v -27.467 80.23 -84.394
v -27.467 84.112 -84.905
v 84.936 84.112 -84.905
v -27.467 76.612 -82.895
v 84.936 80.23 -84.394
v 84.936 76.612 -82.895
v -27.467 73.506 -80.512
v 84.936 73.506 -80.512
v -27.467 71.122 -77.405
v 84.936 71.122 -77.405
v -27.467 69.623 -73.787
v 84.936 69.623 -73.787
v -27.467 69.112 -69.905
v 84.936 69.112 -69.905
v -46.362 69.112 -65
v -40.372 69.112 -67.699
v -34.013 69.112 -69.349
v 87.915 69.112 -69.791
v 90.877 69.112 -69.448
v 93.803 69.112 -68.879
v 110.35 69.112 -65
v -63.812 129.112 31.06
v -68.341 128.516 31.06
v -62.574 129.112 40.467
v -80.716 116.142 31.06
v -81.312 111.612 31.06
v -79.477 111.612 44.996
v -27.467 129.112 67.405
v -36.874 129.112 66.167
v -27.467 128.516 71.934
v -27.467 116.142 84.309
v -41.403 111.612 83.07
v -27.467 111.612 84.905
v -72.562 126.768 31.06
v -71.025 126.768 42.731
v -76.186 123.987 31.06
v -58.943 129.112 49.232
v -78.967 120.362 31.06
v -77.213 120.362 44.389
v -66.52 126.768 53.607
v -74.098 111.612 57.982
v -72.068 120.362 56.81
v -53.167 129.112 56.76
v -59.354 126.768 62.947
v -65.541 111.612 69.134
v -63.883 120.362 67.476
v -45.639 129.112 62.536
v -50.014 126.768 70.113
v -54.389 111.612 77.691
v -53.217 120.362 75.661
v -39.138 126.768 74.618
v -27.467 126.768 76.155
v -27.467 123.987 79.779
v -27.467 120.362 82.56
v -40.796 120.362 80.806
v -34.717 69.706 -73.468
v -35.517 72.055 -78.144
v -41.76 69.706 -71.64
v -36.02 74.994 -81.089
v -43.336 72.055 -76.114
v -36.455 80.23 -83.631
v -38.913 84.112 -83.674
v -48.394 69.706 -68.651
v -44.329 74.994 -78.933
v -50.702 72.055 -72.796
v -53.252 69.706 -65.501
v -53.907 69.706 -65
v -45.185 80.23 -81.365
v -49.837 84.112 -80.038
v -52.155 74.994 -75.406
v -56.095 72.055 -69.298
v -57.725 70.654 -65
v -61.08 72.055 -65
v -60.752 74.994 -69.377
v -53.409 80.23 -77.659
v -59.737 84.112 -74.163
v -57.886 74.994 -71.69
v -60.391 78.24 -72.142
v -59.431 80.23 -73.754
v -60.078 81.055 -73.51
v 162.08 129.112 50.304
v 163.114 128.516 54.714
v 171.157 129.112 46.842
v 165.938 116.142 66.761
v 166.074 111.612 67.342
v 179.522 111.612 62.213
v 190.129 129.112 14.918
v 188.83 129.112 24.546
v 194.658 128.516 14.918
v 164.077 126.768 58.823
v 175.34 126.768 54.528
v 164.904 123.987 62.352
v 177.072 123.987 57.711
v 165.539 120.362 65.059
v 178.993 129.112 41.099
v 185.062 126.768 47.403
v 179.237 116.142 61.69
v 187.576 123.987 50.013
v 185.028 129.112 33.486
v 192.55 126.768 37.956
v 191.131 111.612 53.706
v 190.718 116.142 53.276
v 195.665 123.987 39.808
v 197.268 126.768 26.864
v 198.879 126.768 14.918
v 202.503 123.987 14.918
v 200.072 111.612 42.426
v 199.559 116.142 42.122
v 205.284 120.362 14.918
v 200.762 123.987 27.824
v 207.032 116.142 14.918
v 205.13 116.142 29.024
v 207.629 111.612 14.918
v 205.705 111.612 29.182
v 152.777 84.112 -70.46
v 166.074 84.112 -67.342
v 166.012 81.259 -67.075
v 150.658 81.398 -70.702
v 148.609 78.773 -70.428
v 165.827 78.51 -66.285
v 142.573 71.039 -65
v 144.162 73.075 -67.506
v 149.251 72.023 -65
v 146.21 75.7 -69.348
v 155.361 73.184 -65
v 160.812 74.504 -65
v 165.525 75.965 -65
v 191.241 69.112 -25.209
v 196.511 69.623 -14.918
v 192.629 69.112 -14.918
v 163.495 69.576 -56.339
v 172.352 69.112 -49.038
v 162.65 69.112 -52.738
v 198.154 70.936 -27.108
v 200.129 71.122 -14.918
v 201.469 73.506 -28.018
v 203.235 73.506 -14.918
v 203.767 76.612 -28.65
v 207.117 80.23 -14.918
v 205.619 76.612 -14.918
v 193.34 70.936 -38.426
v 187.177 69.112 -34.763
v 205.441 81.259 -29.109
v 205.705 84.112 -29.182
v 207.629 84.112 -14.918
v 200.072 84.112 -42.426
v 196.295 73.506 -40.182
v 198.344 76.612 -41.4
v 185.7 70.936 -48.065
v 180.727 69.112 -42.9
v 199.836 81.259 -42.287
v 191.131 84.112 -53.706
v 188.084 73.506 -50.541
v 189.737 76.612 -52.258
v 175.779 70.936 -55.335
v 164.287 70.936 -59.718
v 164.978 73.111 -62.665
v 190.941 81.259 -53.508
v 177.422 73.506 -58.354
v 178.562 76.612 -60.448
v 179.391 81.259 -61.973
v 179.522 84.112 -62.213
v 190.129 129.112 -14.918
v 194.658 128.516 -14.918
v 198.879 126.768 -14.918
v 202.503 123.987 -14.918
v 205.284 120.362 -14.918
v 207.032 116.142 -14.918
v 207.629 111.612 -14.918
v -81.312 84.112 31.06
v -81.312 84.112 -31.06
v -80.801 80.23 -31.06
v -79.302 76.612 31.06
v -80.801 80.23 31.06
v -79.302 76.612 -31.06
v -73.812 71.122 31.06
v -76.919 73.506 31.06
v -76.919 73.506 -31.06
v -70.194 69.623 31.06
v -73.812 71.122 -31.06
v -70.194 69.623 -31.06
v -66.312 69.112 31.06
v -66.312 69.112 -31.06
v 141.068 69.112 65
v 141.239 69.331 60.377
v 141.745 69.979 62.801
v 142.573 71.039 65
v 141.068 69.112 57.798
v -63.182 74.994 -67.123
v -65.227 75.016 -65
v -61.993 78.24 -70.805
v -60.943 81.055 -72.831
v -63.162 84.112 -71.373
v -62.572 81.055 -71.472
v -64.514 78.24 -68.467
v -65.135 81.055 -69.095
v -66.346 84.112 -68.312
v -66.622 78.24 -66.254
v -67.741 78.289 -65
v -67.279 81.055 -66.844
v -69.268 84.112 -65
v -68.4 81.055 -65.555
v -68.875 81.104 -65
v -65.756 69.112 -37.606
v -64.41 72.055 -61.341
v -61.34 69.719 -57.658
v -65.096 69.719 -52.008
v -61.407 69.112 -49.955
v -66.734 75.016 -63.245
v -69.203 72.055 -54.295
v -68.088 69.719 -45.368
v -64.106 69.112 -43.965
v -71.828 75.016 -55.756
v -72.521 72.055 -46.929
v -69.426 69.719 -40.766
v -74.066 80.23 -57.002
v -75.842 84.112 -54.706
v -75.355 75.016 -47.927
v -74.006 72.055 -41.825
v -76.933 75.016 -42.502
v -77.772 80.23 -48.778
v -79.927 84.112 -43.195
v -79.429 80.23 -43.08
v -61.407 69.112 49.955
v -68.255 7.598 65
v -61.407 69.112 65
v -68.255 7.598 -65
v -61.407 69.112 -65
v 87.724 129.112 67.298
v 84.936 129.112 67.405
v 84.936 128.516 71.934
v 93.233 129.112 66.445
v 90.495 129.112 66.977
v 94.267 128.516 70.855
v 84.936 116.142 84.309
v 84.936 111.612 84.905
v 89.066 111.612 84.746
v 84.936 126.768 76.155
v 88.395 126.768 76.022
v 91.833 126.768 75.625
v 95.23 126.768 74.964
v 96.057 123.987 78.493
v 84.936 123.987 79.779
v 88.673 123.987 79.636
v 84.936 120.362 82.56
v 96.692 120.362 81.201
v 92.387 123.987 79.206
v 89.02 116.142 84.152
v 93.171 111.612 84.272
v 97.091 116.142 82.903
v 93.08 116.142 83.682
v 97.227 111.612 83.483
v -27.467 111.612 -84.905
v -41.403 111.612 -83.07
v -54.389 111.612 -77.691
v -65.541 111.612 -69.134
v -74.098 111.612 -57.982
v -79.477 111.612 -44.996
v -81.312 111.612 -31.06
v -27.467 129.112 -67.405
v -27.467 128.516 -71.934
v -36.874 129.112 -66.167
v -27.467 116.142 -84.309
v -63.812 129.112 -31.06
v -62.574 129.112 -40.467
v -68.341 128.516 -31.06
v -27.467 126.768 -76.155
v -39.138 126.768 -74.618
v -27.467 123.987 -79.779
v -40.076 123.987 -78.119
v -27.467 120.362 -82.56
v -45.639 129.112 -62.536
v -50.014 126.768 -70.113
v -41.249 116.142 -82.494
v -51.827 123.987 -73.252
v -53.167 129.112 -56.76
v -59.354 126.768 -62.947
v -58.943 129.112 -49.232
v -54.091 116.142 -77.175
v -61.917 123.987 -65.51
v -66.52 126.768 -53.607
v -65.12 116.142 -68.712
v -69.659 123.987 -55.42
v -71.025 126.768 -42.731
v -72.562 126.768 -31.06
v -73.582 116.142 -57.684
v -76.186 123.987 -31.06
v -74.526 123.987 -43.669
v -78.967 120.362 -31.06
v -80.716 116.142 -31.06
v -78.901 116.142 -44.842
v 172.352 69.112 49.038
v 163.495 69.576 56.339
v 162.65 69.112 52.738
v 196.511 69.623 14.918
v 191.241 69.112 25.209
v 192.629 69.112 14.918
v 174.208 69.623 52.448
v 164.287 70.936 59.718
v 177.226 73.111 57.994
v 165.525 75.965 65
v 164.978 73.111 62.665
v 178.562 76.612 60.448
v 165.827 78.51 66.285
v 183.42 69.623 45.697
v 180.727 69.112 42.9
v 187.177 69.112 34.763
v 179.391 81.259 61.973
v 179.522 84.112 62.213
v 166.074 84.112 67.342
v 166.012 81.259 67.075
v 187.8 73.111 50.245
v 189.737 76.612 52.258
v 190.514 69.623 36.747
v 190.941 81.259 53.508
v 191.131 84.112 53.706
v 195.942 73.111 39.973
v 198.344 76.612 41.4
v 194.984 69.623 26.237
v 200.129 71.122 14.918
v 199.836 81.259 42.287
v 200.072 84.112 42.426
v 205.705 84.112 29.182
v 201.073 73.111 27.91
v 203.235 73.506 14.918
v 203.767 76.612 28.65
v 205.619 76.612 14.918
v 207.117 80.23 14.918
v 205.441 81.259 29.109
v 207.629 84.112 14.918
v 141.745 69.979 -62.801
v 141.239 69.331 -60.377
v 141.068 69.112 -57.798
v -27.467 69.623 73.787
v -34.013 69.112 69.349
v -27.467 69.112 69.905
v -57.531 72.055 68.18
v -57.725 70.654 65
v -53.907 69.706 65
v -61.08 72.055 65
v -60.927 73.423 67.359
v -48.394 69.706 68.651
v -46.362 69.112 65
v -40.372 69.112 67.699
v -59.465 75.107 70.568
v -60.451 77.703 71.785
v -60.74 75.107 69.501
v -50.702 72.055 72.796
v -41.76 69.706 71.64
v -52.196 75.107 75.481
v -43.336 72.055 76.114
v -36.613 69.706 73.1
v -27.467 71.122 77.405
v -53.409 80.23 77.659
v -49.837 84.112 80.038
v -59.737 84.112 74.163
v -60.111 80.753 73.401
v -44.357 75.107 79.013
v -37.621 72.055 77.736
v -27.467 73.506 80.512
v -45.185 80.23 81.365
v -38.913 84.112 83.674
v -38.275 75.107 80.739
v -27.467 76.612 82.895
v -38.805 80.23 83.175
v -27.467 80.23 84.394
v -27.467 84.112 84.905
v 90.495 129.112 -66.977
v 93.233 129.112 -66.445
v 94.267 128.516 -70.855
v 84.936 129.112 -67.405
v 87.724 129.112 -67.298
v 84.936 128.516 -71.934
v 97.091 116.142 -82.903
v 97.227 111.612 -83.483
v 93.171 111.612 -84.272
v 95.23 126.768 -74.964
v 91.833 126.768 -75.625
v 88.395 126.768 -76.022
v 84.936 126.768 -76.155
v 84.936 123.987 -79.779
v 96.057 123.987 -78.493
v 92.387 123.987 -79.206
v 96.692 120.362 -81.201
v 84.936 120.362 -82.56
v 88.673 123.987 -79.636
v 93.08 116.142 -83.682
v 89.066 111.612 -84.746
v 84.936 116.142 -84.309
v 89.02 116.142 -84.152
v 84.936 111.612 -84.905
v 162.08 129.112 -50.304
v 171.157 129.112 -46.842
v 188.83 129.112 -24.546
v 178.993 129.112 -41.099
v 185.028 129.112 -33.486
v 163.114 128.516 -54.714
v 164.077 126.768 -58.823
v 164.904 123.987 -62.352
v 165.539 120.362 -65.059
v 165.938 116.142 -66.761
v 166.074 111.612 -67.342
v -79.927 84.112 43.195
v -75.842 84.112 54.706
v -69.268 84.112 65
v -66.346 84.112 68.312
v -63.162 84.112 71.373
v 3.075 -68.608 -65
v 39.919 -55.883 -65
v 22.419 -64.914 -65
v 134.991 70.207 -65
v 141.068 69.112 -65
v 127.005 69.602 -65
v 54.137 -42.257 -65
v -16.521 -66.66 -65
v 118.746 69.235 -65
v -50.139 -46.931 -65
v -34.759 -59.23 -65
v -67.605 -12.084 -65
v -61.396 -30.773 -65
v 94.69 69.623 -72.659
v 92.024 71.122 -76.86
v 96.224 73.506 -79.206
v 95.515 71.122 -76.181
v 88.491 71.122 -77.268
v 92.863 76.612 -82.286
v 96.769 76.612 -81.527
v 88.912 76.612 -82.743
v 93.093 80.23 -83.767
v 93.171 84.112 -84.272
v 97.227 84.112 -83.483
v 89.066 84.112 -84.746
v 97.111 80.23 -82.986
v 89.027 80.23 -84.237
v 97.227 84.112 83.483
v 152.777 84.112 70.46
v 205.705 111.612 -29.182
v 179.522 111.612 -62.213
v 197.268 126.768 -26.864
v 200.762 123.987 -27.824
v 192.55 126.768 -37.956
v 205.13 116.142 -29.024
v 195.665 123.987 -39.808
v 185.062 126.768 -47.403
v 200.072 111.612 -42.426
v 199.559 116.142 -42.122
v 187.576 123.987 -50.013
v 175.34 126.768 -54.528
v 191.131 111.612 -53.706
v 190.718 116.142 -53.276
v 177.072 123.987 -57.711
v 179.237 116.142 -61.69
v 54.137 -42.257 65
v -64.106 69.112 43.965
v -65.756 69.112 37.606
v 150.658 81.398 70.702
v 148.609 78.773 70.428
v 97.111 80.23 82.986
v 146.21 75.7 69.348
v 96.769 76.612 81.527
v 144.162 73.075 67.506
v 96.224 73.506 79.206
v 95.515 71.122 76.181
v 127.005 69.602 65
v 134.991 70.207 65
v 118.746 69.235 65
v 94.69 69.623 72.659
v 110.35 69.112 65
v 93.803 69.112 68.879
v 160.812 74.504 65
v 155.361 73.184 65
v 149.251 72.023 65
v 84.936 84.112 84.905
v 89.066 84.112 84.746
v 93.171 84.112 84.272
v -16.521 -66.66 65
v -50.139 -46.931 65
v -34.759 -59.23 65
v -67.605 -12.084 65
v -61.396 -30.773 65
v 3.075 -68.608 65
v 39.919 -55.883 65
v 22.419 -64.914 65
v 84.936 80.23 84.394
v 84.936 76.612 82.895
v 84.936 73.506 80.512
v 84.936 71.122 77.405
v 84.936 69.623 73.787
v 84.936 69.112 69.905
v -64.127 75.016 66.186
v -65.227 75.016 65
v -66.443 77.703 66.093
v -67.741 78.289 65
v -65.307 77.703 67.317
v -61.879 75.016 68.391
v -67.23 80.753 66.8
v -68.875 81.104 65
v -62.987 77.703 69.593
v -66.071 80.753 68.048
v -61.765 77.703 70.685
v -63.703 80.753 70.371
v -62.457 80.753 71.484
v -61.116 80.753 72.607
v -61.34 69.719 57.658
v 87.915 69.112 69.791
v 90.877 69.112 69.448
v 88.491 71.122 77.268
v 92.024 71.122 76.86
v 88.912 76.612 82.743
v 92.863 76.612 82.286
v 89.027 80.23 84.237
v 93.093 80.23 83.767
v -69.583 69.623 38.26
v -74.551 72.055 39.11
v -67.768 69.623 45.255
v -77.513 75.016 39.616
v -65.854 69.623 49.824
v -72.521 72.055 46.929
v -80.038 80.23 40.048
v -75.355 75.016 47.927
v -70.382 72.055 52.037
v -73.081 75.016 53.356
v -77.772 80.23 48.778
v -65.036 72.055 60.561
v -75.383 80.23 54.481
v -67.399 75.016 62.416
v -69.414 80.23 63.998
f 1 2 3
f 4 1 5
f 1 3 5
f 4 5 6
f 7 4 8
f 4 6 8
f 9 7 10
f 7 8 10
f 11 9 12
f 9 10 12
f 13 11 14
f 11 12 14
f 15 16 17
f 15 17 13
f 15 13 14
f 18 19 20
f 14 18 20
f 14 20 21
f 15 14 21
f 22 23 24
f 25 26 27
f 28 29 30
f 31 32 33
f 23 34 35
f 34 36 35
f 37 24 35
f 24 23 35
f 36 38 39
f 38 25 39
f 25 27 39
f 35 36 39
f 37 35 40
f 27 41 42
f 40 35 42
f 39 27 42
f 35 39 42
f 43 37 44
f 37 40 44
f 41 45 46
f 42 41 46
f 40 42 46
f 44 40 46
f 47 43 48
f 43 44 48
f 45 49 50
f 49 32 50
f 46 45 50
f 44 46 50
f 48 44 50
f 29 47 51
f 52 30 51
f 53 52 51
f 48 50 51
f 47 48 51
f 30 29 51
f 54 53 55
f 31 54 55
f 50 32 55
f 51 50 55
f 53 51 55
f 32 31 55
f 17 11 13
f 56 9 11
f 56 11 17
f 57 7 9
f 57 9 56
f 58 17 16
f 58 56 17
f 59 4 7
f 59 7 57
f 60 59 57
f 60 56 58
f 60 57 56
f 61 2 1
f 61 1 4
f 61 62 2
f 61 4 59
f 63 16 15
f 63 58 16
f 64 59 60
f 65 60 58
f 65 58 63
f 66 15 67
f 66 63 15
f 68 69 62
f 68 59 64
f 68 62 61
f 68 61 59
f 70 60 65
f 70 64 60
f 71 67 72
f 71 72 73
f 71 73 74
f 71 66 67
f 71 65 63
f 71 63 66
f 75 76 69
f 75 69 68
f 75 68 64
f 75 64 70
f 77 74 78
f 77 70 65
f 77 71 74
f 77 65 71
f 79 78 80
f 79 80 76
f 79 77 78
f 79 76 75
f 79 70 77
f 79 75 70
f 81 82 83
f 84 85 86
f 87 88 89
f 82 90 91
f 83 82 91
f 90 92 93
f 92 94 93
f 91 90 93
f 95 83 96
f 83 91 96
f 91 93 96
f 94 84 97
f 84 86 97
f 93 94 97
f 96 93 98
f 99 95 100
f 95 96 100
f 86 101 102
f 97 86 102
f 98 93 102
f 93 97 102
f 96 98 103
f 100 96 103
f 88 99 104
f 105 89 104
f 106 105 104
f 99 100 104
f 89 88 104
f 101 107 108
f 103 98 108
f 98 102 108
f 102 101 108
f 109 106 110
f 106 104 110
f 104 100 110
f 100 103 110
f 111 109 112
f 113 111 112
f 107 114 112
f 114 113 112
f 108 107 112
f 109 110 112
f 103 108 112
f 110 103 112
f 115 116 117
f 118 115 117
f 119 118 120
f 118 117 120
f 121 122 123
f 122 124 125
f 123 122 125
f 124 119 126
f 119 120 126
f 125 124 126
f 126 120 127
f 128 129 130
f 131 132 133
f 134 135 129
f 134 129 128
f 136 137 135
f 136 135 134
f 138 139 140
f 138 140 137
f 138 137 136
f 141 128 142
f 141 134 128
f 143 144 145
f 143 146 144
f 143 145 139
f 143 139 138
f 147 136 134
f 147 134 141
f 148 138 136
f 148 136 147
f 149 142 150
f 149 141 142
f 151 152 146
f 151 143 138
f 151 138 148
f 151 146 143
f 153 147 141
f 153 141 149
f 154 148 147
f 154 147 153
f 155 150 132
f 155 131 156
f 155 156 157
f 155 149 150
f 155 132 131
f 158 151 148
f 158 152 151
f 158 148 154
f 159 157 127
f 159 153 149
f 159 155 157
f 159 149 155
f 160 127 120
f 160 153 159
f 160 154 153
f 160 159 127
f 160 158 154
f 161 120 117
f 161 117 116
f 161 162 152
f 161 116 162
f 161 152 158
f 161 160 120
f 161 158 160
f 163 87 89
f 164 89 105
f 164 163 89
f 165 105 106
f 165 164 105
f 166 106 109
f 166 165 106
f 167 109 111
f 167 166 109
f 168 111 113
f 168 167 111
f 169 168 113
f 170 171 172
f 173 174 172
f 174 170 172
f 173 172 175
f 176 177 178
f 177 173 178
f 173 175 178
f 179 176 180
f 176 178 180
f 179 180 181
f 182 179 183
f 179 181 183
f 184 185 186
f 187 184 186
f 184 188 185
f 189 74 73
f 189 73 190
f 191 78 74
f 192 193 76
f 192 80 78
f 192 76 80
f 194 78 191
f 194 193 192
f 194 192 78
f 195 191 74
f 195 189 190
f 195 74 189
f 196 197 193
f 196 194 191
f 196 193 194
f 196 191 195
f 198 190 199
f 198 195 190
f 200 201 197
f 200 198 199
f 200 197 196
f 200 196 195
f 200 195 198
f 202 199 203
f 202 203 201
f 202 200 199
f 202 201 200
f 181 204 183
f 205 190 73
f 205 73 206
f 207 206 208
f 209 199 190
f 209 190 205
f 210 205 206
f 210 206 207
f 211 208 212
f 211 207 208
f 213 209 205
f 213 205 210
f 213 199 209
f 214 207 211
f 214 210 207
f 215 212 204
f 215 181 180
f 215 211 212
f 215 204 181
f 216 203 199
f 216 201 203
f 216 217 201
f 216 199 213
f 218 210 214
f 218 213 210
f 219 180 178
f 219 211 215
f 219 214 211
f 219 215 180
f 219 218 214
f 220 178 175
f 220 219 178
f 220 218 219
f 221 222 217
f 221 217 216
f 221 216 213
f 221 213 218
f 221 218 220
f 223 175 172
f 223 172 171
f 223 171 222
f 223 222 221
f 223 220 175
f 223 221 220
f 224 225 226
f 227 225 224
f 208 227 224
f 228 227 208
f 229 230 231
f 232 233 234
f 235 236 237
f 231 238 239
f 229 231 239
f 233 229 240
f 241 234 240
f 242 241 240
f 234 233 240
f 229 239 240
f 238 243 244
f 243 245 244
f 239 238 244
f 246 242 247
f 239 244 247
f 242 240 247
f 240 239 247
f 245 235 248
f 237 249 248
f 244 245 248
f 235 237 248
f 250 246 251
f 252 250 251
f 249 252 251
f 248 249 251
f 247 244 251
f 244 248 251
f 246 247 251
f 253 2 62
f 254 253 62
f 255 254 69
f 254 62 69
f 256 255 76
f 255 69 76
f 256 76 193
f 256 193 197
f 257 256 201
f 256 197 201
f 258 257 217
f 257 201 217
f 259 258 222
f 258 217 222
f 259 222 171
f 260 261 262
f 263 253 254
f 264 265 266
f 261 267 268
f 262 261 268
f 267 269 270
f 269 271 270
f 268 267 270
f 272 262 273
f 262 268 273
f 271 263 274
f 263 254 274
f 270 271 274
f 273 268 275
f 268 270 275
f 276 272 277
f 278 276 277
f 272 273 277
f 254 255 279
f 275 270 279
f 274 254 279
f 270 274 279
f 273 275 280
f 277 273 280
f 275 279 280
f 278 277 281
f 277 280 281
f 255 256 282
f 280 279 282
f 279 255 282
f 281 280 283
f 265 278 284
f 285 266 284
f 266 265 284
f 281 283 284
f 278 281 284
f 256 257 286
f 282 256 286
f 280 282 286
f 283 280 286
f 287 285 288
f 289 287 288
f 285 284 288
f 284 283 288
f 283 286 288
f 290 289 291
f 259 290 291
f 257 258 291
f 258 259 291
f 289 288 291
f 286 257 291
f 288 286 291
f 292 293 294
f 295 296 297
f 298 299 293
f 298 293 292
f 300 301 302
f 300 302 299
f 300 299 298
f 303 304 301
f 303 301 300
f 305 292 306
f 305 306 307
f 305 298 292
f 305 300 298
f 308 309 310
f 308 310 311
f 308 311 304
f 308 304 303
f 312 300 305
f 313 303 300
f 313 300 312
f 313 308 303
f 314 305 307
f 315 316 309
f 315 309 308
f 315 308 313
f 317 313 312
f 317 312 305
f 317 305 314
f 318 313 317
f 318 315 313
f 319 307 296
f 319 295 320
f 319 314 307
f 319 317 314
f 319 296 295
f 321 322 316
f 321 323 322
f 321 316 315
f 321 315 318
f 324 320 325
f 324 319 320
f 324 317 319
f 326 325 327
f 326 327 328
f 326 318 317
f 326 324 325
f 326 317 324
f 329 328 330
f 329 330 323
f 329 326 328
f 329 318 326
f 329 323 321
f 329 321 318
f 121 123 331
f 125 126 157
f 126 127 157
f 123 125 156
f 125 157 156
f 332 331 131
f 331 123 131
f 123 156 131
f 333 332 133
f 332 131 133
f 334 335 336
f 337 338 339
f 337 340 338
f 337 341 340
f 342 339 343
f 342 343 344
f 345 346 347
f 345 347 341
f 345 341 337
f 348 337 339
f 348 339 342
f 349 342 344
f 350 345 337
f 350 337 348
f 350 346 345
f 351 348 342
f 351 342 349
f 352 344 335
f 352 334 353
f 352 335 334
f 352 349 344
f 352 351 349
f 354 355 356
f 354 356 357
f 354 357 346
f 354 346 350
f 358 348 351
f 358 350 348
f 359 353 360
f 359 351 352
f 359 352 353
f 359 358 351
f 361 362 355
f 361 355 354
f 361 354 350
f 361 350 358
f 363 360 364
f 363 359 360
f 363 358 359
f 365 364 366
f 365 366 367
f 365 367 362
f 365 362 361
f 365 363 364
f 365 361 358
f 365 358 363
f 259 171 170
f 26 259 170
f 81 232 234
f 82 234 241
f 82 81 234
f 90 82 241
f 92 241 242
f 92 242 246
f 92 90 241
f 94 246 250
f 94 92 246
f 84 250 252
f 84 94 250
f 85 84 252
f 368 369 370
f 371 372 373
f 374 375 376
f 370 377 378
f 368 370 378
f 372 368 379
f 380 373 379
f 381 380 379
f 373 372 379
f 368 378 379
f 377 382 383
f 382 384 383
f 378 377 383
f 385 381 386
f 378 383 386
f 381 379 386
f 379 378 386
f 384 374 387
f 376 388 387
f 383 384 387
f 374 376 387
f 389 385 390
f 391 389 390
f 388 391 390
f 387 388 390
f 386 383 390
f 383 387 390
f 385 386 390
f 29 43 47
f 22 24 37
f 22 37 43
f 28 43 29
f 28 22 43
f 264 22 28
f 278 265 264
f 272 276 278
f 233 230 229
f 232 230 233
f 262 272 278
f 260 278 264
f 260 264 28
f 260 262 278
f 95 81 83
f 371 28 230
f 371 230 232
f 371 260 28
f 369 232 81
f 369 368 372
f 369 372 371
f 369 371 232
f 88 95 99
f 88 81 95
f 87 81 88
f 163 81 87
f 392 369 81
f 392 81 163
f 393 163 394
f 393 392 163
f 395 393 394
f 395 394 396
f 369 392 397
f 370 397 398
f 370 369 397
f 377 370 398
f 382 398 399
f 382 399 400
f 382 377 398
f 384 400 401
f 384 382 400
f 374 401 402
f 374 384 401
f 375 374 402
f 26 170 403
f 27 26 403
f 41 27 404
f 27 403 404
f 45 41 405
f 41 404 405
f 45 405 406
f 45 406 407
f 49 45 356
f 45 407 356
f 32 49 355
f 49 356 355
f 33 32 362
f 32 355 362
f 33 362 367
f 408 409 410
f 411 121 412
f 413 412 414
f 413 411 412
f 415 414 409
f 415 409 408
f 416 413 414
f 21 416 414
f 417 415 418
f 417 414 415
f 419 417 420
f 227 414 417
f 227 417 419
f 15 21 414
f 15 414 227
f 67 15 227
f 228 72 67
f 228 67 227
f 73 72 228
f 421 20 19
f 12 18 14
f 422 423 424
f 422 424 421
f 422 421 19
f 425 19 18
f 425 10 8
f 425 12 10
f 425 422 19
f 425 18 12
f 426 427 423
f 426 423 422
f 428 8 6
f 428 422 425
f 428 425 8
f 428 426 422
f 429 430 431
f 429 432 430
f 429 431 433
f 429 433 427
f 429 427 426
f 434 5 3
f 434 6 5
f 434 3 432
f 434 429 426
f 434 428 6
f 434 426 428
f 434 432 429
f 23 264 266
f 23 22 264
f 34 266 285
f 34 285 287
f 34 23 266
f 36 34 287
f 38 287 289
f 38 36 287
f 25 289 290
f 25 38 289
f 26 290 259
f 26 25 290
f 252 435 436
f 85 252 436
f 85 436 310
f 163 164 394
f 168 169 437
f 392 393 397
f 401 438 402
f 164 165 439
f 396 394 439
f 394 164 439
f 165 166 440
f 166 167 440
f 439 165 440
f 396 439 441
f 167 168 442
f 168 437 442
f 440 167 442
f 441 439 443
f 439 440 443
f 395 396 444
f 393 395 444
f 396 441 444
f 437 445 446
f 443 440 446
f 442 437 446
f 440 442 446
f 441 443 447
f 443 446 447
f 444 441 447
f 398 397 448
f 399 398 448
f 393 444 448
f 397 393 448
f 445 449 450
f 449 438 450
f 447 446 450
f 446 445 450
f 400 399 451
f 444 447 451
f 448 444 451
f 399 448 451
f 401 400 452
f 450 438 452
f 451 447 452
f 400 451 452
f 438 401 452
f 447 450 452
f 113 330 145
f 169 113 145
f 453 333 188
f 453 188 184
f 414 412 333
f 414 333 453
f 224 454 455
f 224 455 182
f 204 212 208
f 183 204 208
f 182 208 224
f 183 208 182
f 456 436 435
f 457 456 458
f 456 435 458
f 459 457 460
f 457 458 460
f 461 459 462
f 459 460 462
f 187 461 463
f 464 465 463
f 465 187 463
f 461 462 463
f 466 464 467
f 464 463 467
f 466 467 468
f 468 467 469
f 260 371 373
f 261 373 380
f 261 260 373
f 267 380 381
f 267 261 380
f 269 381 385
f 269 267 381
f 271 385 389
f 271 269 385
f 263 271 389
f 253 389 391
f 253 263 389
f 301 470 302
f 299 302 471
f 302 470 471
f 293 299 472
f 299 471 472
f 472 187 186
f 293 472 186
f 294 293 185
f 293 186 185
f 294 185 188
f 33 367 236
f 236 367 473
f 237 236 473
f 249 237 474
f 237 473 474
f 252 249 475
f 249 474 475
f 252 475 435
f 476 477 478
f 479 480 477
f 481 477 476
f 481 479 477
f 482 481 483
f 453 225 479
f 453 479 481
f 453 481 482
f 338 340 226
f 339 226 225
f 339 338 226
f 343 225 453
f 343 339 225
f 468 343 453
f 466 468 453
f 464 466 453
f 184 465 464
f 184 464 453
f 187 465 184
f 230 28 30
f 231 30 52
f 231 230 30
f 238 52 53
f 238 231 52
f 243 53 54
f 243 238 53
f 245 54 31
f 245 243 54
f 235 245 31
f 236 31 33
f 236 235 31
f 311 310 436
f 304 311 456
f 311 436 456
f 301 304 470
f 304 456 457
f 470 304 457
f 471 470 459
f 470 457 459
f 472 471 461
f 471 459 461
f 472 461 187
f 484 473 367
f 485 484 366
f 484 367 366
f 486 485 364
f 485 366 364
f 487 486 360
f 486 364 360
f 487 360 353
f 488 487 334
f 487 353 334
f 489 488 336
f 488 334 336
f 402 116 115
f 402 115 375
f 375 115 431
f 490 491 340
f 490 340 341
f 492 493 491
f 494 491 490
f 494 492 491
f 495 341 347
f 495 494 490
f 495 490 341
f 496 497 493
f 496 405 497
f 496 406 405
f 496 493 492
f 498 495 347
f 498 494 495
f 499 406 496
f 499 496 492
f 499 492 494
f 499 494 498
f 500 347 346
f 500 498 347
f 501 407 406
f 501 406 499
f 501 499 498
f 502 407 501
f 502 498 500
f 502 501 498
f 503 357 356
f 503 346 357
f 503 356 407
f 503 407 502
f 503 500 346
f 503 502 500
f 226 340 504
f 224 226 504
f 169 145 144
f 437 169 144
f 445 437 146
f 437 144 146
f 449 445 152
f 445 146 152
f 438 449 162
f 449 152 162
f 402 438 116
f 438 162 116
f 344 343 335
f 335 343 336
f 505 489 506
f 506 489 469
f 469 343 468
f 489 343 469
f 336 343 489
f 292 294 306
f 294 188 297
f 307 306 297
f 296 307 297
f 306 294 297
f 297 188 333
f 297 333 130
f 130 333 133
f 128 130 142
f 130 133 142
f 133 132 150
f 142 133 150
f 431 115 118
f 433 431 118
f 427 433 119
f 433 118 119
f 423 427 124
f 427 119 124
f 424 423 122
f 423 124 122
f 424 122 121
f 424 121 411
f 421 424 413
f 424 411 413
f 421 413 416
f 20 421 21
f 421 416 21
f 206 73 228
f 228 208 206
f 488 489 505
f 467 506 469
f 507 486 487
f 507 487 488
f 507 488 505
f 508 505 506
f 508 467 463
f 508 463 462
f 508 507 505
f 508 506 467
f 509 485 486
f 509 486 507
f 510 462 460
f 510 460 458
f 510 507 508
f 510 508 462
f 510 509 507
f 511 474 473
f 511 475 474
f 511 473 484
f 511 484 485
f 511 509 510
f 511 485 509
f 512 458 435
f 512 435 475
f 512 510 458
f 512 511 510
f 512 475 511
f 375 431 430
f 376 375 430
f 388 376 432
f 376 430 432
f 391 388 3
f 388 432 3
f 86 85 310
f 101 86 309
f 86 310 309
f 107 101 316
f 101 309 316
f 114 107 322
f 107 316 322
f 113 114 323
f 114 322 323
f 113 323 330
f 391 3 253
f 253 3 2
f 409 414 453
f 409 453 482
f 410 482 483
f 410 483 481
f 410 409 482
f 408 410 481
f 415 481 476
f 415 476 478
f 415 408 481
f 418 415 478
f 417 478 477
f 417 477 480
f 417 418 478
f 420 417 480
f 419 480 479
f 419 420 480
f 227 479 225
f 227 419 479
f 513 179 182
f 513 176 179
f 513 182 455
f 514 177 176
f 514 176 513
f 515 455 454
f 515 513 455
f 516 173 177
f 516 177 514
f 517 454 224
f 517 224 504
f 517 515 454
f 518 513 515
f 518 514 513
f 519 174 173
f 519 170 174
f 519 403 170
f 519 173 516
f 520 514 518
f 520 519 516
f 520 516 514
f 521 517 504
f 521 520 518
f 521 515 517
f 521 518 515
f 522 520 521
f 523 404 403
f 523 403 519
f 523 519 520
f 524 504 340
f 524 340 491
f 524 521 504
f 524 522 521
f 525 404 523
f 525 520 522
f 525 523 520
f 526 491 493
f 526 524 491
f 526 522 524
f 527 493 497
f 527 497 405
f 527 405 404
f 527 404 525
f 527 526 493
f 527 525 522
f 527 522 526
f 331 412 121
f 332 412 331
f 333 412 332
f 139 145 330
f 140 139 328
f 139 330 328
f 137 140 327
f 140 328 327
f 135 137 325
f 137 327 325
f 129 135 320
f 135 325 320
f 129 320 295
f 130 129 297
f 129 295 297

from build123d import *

# Parameters (mm, degrees)
GRIPPER_BLOCK_EXTRUDE_DEPTH      = 65
GRIPPER_BLOCK_EXTRUDE_DEPTH_BACK = 65
GRIPPER_PAD_EXTRUDE_DEPTH        = 60
FILLET1_R                        = 15
FILLET2_R                        = 17.5


with BuildPart() as part:
    # Gripper Block Sketch → Gripper Block Extrude (new, two sides: drawn at the far end of the back side and taken through both)
    with BuildSketch(Plane.XY.offset(-GRIPPER_BLOCK_EXTRUDE_DEPTH_BACK)):
        with BuildLine():
            Line((-61.407052481, 69.112327645), (141.068280517, 69.112327645))
            Line((141.068280517, 69.112327645), (54.136656509, -42.257350137))
            ThreePointArc((54.136656509, -42.257350137), (-25.908018032, -63.602168361), (-68.254877777, 7.598215467))
            Line((-68.254877777, 7.598215467), (-61.407052481, 69.112327645))
        make_face()
    extrude(amount=GRIPPER_BLOCK_EXTRUDE_DEPTH + GRIPPER_BLOCK_EXTRUDE_DEPTH_BACK)

    # Gripper Pad Sketch → Gripper Pad Extrude (add)
    with BuildSketch(Plane(origin=(0, 69.112327645, 0), x_dir=(1, 0, 0), z_dir=(0, 1, 0))):
        with BuildLine():
            Line((207.628558986, -14.918457632), (207.628558986, 14.918457632))
            ThreePointArc((207.628558986, 14.918457632), (195.980022657, 48.366091724), (166.074369452, 67.341985153))
            Line((166.074369452, 67.341985153), (97.227334679, 83.483421268))
            ThreePointArc((97.227334679, 83.483421268), (91.122858963, 84.548401278), (84.936449194, 84.904968765))
            Line((84.936449194, 84.904968765), (-27.466946228, 84.904968765))
            ThreePointArc((-27.466946228, 84.904968765), (-65.541163907, 69.134111426), (-81.312021247, 31.059893746))
            Line((-81.312021247, 31.059893746), (-81.312021247, -31.059893746))
            ThreePointArc((-81.312021247, -31.059893746), (-65.541163907, -69.134111426), (-27.466946228, -84.904968765))
            Line((-27.466946228, -84.904968765), (84.936449194, -84.904968765))
            ThreePointArc((84.936449194, -84.904968765), (91.122858963, -84.548401278), (97.227334679, -83.483421268))
            Line((97.227334679, -83.483421268), (166.074369452, -67.341985153))
            ThreePointArc((166.074369452, -67.341985153), (195.980022657, -48.366091724), (207.628558986, -14.918457632))
        make_face()
    extrude(amount=GRIPPER_PAD_EXTRUDE_DEPTH)

    # Fillet1
    # the kernel refuses this fillet: 15 mm, written as the material it takes off along each edge
    with BuildSketch(Plane(origin=(-27.466946228, 69.112327645, 31.059893746), x_dir=(-1, 0, 0), z_dir=(0, 0, -1))) as fillet1_piece_1_section:
        with BuildLine():
            CenterArc((53.845075019 - FILLET1_R, FILLET1_R), FILLET1_R, 270, 90)
            Line((53.845075019, FILLET1_R), (53.845075019, 0))
            Line((53.845075019, 0), (53.845075019 - FILLET1_R, 0))
        make_face()
    fillet1_piece_1 = revolve(axis=Axis((-27.466946228, 69.112327645, 31.059893746), (0, 1, 0)), revolution_arc=90, mode=Mode.PRIVATE)
    fillet1_piece_1 = split(fillet1_piece_1, bisect_by=Plane(origin=(-73.84979, 72.577751754, 65), z_dir=(0, 0, -1)), keep=Keep.TOP, mode=Mode.PRIVATE)
    fillet1_piece_1 = split(fillet1_piece_1, bisect_by=Plane(origin=(-61.178307507, 71.167147012, 48.44878025), z_dir=(-0.9938607953898665, 0.1106377846263296, 0)), keep=Keep.TOP, mode=Mode.PRIVATE)
    add(fillet1_piece_1, mode=Mode.SUBTRACT)
    with BuildSketch(Plane(origin=(-27.466946228, 69.112327645, 31.059893746), x_dir=(-1, 0, 0), z_dir=(0, 0, -1))) as fillet1_piece_2_section:
        with BuildLine():
            CenterArc((53.845075019 - FILLET1_R, FILLET1_R), FILLET1_R, 270, 90)
            Line((53.845075019, FILLET1_R), (53.845075019, 0))
            Line((53.845075019, 0), (53.845075019 - FILLET1_R, 0))
        make_face()
    fillet1_piece_2 = revolve(axis=Axis((-27.466946228, 69.112327645, 31.059893746), (0, 1, 0)), revolution_arc=90, mode=Mode.PRIVATE)
    fillet1_piece_2 = split(fillet1_piece_2, bisect_by=Plane(origin=(-64.322526984, 74.085740729, 65), z_dir=(0, 0, 1)), keep=Keep.TOP, mode=Mode.PRIVATE)
    fillet1_piece_2 = split(fillet1_piece_2, bisect_by=Plane(origin=(-60.895870662, 73.704281207, 68.420730392), z_dir=(-0.9938607953898665, 0.1106377846263296, 0)), keep=Keep.TOP, mode=Mode.PRIVATE)
    add(fillet1_piece_2, mode=Mode.SUBTRACT)
    with BuildSketch(Plane(origin=(-27.466946228, 69.112327645, 31.059893746), x_dir=(-1, 0, 0), z_dir=(0, 0, -1))) as fillet1_piece_3_section:
        with BuildLine():
            CenterArc((53.845075019 - FILLET1_R, FILLET1_R), FILLET1_R, 270, 90)
            Line((53.845075019, FILLET1_R), (53.845075019, 0))
            Line((53.845075019, 0), (53.845075019 - FILLET1_R, 0))
        make_face()
    fillet1_piece_3 = revolve(axis=Axis((-27.466946228, 69.112327645, 31.059893746), (0, 1, 0)), revolution_arc=90, mode=Mode.PRIVATE)
    fillet1_piece_3 = split(fillet1_piece_3, bisect_by=Plane(origin=(-44.631950022, 72.537046156, 65), z_dir=(0, 0, 1)), keep=Keep.TOP, mode=Mode.PRIVATE)
    fillet1_piece_3 = split(fillet1_piece_3, bisect_by=Plane(origin=(-60.825136055, 74.339691191, 77.53132991), z_dir=(0.9938607953898665, -0.1106377846263296, 0)), keep=Keep.TOP, mode=Mode.PRIVATE)
    add(fillet1_piece_3, mode=Mode.SUBTRACT)
    with BuildSketch(Plane(origin=(-27.466946228, 69.112327645, 84.904968765), x_dir=(0, 0, -1), z_dir=(1, 0, 0)), Plane(origin=(84.936449194, 69.112327645, -84.904968765), x_dir=(0, 0, 1), z_dir=(-1, 0, 0))) as fillet1_piece_4:
        with BuildLine():
            CenterArc((FILLET1_R, FILLET1_R), FILLET1_R, 180, 90)
            Line((0, FILLET1_R), (0, 0))
            Line((0, 0), (FILLET1_R, 0))
        make_face()
    extrude(amount=112.403395422, mode=Mode.SUBTRACT)
    with BuildSketch(Plane(origin=(84.936449194, 69.112327645, 31.059893746), x_dir=(0, 0, 1), z_dir=(-1, 0, 0))) as fillet1_piece_5:
        with BuildLine():
            CenterArc((53.845075019 - FILLET1_R, FILLET1_R), FILLET1_R, 270, 90)
            Line((53.845075019, FILLET1_R), (53.845075019, 0))
            Line((53.845075019, 0), (53.845075019 - FILLET1_R, 0))
        make_face()
    revolve(axis=Axis((84.936449194, 69.112327645, 31.059893746), (0, 1, 0)), revolution_arc=13.194880345, mode=Mode.SUBTRACT)
    with BuildSketch(Plane(origin=(97.227334679, 69.112327645, 83.483421268), x_dir=(-0.22826387521668148, 0, -0.9735993032408473), z_dir=(0.9735993032408473, 0, -0.22826387521668148))) as fillet1_piece_6_section:
        with BuildLine():
            CenterArc((FILLET1_R, FILLET1_R), FILLET1_R, 180, 90)
            Line((0, FILLET1_R), (0, 0))
            Line((0, 0), (FILLET1_R, 0))
        make_face()
    fillet1_piece_6 = extrude(amount=70.713931844, mode=Mode.PRIVATE)
    fillet1_piece_6 = split(fillet1_piece_6, bisect_by=Plane(origin=(119.836470057, 72.733873608, 65), z_dir=(0, 0, 1)), keep=Keep.TOP, mode=Mode.PRIVATE)
    fillet1_piece_6 = split(fillet1_piece_6, bisect_by=Plane(origin=(134.786369737, 61.064457984, 74.954099128), z_dir=(-0.7882850610871249, 0.6153102164492865, 0)), keep=Keep.TOP, mode=Mode.PRIVATE)
    add(fillet1_piece_6, mode=Mode.SUBTRACT)
    with BuildSketch(Plane(origin=(97.227334679, 69.112327645, 83.483421268), x_dir=(-0.22826387521668148, 0, -0.9735993032408473), z_dir=(0.9735993032408473, 0, -0.22826387521668148))) as fillet1_piece_7_section:
        with BuildLine():
            CenterArc((FILLET1_R, FILLET1_R), FILLET1_R, 180, 90)
            Line((0, FILLET1_R), (0, 0))
            Line((0, 0), (FILLET1_R, 0))
        make_face()
    fillet1_piece_7 = extrude(amount=70.713931844, mode=Mode.PRIVATE)
    fillet1_piece_7 = split(fillet1_piece_7, bisect_by=Plane(origin=(153.801497728, 73.000872284, 65), z_dir=(0, 0, 1)), keep=Keep.TOP, mode=Mode.PRIVATE)
    fillet1_piece_7 = split(fillet1_piece_7, bisect_by=Plane(origin=(147.775260503, 77.704761162, 68.23623244), z_dir=(0.7882850610871249, -0.6153102164492865, 0)), keep=Keep.TOP, mode=Mode.PRIVATE)
    add(fillet1_piece_7, mode=Mode.SUBTRACT)
    with BuildSketch(Plane(origin=(97.227334679, 69.112327645, 83.483421268), x_dir=(-0.22826387521668148, 0, -0.9735993032408473), z_dir=(0.9735993032408473, 0, -0.22826387521668148))) as fillet1_piece_8_section:
        with BuildLine():
            CenterArc((FILLET1_R, FILLET1_R), FILLET1_R, 180, 90)
            Line((0, FILLET1_R), (0, 0))
            Line((0, 0), (FILLET1_R, 0))
        make_face()
    fillet1_piece_8 = extrude(amount=70.713931844, mode=Mode.PRIVATE)
    fillet1_piece_8 = split(fillet1_piece_8, bisect_by=Plane(origin=(155.820732403, 70.160373086, 65), z_dir=(0, 0, -1)), keep=Keep.TOP, mode=Mode.PRIVATE)
    fillet1_piece_8 = split(fillet1_piece_8, bisect_by=Plane(origin=(147.162000894, 76.919103172, 62.047586318), z_dir=(0.7882850610871249, -0.6153102164492865, 0)), keep=Keep.TOP, mode=Mode.PRIVATE)
    add(fillet1_piece_8, mode=Mode.SUBTRACT)
    with BuildSketch(Plane(origin=(153.783483967, 69.112327645, 14.918457632), x_dir=(0.22826387521668226, 0, 0.973599303240847), z_dir=(-0.973599303240847, 0, 0.22826387521668226))) as fillet1_piece_9:
        with BuildLine():
            CenterArc((53.845075019 - FILLET1_R, FILLET1_R), FILLET1_R, 270, 90)
            Line((53.845075019 - FILLET1_R, 0), (53.845075019, 0))
            Line((53.845075019, 0), (53.845075019, FILLET1_R))
        make_face()
    revolve(axis=Axis((153.783483967, 69.112327645, 14.918457632), (0, 1, 0)), revolution_arc=76.805119655, mode=Mode.SUBTRACT)
    with BuildSketch(Plane(origin=(207.628558986, 69.112327645, 14.918457632), x_dir=(0, 1, 0), z_dir=(0, 0, -1))) as fillet1_piece_10:
        with BuildLine():
            CenterArc((FILLET1_R, -FILLET1_R), FILLET1_R, 90, 90)
            Line((0, -FILLET1_R), (0, 0))
            Line((0, 0), (FILLET1_R, 0))
        make_face()
    extrude(amount=29.836915263, mode=Mode.SUBTRACT)
    with BuildSketch(Plane(origin=(153.783483967, 69.112327645, -14.918457632), x_dir=(1, 0, 0), z_dir=(0, 0, 1))) as fillet1_piece_11:
        with BuildLine():
            CenterArc((53.845075019 - FILLET1_R, FILLET1_R), FILLET1_R, 270, 90)
            Line((53.845075019 - FILLET1_R, 0), (53.845075019, 0))
            Line((53.845075019, 0), (53.845075019, FILLET1_R))
        make_face()
    revolve(axis=Axis((153.783483967, 69.112327645, -14.918457632), (0, 1, 0)), revolution_arc=76.805119655, mode=Mode.SUBTRACT)
    with BuildSketch(Plane(origin=(166.074369452, 69.112327645, -67.341985153), x_dir=(-0.22826387521668007, 0, 0.9735993032408475), z_dir=(-0.9735993032408476, 0, -0.2282638752166801))) as fillet1_piece_12_section:
        with BuildLine():
            CenterArc((FILLET1_R, FILLET1_R), FILLET1_R, 180, 90)
            Line((0, FILLET1_R), (0, 0))
            Line((0, 0), (FILLET1_R, 0))
        make_face()
    fillet1_piece_12 = extrude(amount=70.713931844, mode=Mode.PRIVATE)
    fillet1_piece_12 = split(fillet1_piece_12, bisect_by=Plane(origin=(147.162000894, 76.919103172, -62.047586318), z_dir=(0.7882850610871249, -0.6153102164492865, 0)), keep=Keep.TOP, mode=Mode.PRIVATE)
    fillet1_piece_12 = split(fillet1_piece_12, bisect_by=Plane(origin=(155.820732403, 70.160373086, -65), z_dir=(0, 0, 1)), keep=Keep.TOP, mode=Mode.PRIVATE)
    add(fillet1_piece_12, mode=Mode.SUBTRACT)
    with BuildSketch(Plane(origin=(166.074369452, 69.112327645, -67.341985153), x_dir=(-0.22826387521668007, 0, 0.9735993032408475), z_dir=(-0.9735993032408476, 0, -0.2282638752166801))) as fillet1_piece_13_section:
        with BuildLine():
            CenterArc((FILLET1_R, FILLET1_R), FILLET1_R, 180, 90)
            Line((0, FILLET1_R), (0, 0))
            Line((0, 0), (FILLET1_R, 0))
        make_face()
    fillet1_piece_13 = extrude(amount=70.713931844, mode=Mode.PRIVATE)
    fillet1_piece_13 = split(fillet1_piece_13, bisect_by=Plane(origin=(147.775260503, 77.704761162, -68.23623244), z_dir=(0.7882850610871249, -0.6153102164492865, 0)), keep=Keep.TOP, mode=Mode.PRIVATE)
    fillet1_piece_13 = split(fillet1_piece_13, bisect_by=Plane(origin=(153.801497728, 73.000872284, -65), z_dir=(0, 0, -1)), keep=Keep.TOP, mode=Mode.PRIVATE)
    add(fillet1_piece_13, mode=Mode.SUBTRACT)
    with BuildSketch(Plane(origin=(166.074369452, 69.112327645, -67.341985153), x_dir=(-0.22826387521668007, 0, 0.9735993032408475), z_dir=(-0.9735993032408476, 0, -0.2282638752166801))) as fillet1_piece_14_section:
        with BuildLine():
            CenterArc((FILLET1_R, FILLET1_R), FILLET1_R, 180, 90)
            Line((0, FILLET1_R), (0, 0))
            Line((0, 0), (FILLET1_R, 0))
        make_face()
    fillet1_piece_14 = extrude(amount=70.713931844, mode=Mode.PRIVATE)
    fillet1_piece_14 = split(fillet1_piece_14, bisect_by=Plane(origin=(134.786369737, 61.064457984, -74.954099128), z_dir=(-0.7882850610871249, 0.6153102164492865, 0)), keep=Keep.TOP, mode=Mode.PRIVATE)
    fillet1_piece_14 = split(fillet1_piece_14, bisect_by=Plane(origin=(119.836470057, 72.733873608, -65), z_dir=(0, 0, -1)), keep=Keep.TOP, mode=Mode.PRIVATE)
    add(fillet1_piece_14, mode=Mode.SUBTRACT)
    with BuildSketch(Plane(origin=(84.936449194, 69.112327645, -31.059893746), x_dir=(0.22826387521668692, 0, -0.973599303240846), z_dir=(0.973599303240846, 0, 0.22826387521668692))) as fillet1_piece_15:
        with BuildLine():
            CenterArc((53.845075019 - FILLET1_R, FILLET1_R), FILLET1_R, 270, 90)
            Line((53.845075019, FILLET1_R), (53.845075019, 0))
            Line((53.845075019, 0), (53.845075019 - FILLET1_R, 0))
        make_face()
    revolve(axis=Axis((84.936449194, 69.112327645, -31.059893746), (0, 1, 0)), revolution_arc=13.194880345, mode=Mode.SUBTRACT)
    with BuildSketch(Plane(origin=(-27.466946228, 69.112327645, -31.059893746), x_dir=(0, 0, -1), z_dir=(1, 0, 0))) as fillet1_piece_16_section:
        with BuildLine():
            CenterArc((53.845075019 - FILLET1_R, FILLET1_R), FILLET1_R, 270, 90)
            Line((53.845075019, FILLET1_R), (53.845075019, 0))
            Line((53.845075019, 0), (53.845075019 - FILLET1_R, 0))
        make_face()
    fillet1_piece_16 = revolve(axis=Axis((-27.466946228, 69.112327645, -31.059893746), (0, 1, 0)), revolution_arc=90, mode=Mode.PRIVATE)
    fillet1_piece_16 = split(fillet1_piece_16, bisect_by=Plane(origin=(-44.631949939, 72.537046047, -65), z_dir=(0, 0, -1)), keep=Keep.TOP, mode=Mode.PRIVATE)
    fillet1_piece_16 = split(fillet1_piece_16, bisect_by=Plane(origin=(-60.825136066, 74.339691093, -77.531329935), z_dir=(0.9938607953898665, -0.1106377846263296, 0)), keep=Keep.TOP, mode=Mode.PRIVATE)
    add(fillet1_piece_16, mode=Mode.SUBTRACT)
    with BuildSketch(Plane(origin=(-27.466946228, 69.112327645, -31.059893746), x_dir=(0, 0, -1), z_dir=(1, 0, 0))) as fillet1_piece_17_section:
        with BuildLine():
            CenterArc((53.845075019 - FILLET1_R, FILLET1_R), FILLET1_R, 270, 90)
            Line((53.845075019, FILLET1_R), (53.845075019, 0))
            Line((53.845075019, 0), (53.845075019 - FILLET1_R, 0))
        make_face()
    fillet1_piece_17 = revolve(axis=Axis((-27.466946228, 69.112327645, -31.059893746), (0, 1, 0)), revolution_arc=90, mode=Mode.PRIVATE)
    fillet1_piece_17 = split(fillet1_piece_17, bisect_by=Plane(origin=(-64.322526993, 74.085740732, -65), z_dir=(0, 0, -1)), keep=Keep.TOP, mode=Mode.PRIVATE)
    fillet1_piece_17 = split(fillet1_piece_17, bisect_by=Plane(origin=(-60.895870662, 73.704281209, -68.420730393), z_dir=(-0.9938607953898665, 0.1106377846263296, 0)), keep=Keep.TOP, mode=Mode.PRIVATE)
    add(fillet1_piece_17, mode=Mode.SUBTRACT)
    with BuildSketch(Plane(origin=(-27.466946228, 69.112327645, -31.059893746), x_dir=(0, 0, -1), z_dir=(1, 0, 0))) as fillet1_piece_18_section:
        with BuildLine():
            CenterArc((53.845075019 - FILLET1_R, FILLET1_R), FILLET1_R, 270, 90)
            Line((53.845075019, FILLET1_R), (53.845075019, 0))
            Line((53.845075019, 0), (53.845075019 - FILLET1_R, 0))
        make_face()
    fillet1_piece_18 = revolve(axis=Axis((-27.466946228, 69.112327645, -31.059893746), (0, 1, 0)), revolution_arc=90, mode=Mode.PRIVATE)
    fillet1_piece_18 = split(fillet1_piece_18, bisect_by=Plane(origin=(-73.849789794, 72.577752581, -65), z_dir=(0, 0, 1)), keep=Keep.TOP, mode=Mode.PRIVATE)
    fillet1_piece_18 = split(fillet1_piece_18, bisect_by=Plane(origin=(-61.178307413, 71.167147852, -48.448780612), z_dir=(-0.9938607953898665, 0.1106377846263296, 0)), keep=Keep.TOP, mode=Mode.PRIVATE)
    add(fillet1_piece_18, mode=Mode.SUBTRACT)
    with BuildSketch(Plane(origin=(-81.312021247, 69.112327645, -31.059893746), x_dir=(1, 0, 0), z_dir=(0, 0, 1))) as fillet1_piece_19:
        with BuildLine():
            CenterArc((FILLET1_R, FILLET1_R), FILLET1_R, 180, 90)
            Line((0, FILLET1_R), (0, 0))
            Line((0, 0), (FILLET1_R, 0))
        make_face()
    extrude(amount=62.119787492, mode=Mode.SUBTRACT)

    # Fillet2
    fillet2_edges = [part.edges().sort_by_distance(p)[0] for p in [
        (-65.541163907, 129.112327645, 69.134111426),
        (28.734751483, 129.112327645, 84.904968765),
        (91.122858963, 129.112327645, 84.548401278),
        (131.650852066, 129.112327645, 75.412703211),
        (195.980022657, 129.112327645, 48.366091724),
        (207.628558986, 129.112327645, 0),
        (195.980022657, 129.112327645, -48.366091724),
        (131.650852066, 129.112327645, -75.412703211),
        (91.122858963, 129.112327645, -84.548401278),
        (28.734751483, 129.112327645, -84.904968765),
        (-65.541163907, 129.112327645, -69.134111426),
        (-81.312021247, 129.112327645, 0),
    ]]
    fillet(fillet2_edges, radius=FILLET2_R)


solid = part.part
